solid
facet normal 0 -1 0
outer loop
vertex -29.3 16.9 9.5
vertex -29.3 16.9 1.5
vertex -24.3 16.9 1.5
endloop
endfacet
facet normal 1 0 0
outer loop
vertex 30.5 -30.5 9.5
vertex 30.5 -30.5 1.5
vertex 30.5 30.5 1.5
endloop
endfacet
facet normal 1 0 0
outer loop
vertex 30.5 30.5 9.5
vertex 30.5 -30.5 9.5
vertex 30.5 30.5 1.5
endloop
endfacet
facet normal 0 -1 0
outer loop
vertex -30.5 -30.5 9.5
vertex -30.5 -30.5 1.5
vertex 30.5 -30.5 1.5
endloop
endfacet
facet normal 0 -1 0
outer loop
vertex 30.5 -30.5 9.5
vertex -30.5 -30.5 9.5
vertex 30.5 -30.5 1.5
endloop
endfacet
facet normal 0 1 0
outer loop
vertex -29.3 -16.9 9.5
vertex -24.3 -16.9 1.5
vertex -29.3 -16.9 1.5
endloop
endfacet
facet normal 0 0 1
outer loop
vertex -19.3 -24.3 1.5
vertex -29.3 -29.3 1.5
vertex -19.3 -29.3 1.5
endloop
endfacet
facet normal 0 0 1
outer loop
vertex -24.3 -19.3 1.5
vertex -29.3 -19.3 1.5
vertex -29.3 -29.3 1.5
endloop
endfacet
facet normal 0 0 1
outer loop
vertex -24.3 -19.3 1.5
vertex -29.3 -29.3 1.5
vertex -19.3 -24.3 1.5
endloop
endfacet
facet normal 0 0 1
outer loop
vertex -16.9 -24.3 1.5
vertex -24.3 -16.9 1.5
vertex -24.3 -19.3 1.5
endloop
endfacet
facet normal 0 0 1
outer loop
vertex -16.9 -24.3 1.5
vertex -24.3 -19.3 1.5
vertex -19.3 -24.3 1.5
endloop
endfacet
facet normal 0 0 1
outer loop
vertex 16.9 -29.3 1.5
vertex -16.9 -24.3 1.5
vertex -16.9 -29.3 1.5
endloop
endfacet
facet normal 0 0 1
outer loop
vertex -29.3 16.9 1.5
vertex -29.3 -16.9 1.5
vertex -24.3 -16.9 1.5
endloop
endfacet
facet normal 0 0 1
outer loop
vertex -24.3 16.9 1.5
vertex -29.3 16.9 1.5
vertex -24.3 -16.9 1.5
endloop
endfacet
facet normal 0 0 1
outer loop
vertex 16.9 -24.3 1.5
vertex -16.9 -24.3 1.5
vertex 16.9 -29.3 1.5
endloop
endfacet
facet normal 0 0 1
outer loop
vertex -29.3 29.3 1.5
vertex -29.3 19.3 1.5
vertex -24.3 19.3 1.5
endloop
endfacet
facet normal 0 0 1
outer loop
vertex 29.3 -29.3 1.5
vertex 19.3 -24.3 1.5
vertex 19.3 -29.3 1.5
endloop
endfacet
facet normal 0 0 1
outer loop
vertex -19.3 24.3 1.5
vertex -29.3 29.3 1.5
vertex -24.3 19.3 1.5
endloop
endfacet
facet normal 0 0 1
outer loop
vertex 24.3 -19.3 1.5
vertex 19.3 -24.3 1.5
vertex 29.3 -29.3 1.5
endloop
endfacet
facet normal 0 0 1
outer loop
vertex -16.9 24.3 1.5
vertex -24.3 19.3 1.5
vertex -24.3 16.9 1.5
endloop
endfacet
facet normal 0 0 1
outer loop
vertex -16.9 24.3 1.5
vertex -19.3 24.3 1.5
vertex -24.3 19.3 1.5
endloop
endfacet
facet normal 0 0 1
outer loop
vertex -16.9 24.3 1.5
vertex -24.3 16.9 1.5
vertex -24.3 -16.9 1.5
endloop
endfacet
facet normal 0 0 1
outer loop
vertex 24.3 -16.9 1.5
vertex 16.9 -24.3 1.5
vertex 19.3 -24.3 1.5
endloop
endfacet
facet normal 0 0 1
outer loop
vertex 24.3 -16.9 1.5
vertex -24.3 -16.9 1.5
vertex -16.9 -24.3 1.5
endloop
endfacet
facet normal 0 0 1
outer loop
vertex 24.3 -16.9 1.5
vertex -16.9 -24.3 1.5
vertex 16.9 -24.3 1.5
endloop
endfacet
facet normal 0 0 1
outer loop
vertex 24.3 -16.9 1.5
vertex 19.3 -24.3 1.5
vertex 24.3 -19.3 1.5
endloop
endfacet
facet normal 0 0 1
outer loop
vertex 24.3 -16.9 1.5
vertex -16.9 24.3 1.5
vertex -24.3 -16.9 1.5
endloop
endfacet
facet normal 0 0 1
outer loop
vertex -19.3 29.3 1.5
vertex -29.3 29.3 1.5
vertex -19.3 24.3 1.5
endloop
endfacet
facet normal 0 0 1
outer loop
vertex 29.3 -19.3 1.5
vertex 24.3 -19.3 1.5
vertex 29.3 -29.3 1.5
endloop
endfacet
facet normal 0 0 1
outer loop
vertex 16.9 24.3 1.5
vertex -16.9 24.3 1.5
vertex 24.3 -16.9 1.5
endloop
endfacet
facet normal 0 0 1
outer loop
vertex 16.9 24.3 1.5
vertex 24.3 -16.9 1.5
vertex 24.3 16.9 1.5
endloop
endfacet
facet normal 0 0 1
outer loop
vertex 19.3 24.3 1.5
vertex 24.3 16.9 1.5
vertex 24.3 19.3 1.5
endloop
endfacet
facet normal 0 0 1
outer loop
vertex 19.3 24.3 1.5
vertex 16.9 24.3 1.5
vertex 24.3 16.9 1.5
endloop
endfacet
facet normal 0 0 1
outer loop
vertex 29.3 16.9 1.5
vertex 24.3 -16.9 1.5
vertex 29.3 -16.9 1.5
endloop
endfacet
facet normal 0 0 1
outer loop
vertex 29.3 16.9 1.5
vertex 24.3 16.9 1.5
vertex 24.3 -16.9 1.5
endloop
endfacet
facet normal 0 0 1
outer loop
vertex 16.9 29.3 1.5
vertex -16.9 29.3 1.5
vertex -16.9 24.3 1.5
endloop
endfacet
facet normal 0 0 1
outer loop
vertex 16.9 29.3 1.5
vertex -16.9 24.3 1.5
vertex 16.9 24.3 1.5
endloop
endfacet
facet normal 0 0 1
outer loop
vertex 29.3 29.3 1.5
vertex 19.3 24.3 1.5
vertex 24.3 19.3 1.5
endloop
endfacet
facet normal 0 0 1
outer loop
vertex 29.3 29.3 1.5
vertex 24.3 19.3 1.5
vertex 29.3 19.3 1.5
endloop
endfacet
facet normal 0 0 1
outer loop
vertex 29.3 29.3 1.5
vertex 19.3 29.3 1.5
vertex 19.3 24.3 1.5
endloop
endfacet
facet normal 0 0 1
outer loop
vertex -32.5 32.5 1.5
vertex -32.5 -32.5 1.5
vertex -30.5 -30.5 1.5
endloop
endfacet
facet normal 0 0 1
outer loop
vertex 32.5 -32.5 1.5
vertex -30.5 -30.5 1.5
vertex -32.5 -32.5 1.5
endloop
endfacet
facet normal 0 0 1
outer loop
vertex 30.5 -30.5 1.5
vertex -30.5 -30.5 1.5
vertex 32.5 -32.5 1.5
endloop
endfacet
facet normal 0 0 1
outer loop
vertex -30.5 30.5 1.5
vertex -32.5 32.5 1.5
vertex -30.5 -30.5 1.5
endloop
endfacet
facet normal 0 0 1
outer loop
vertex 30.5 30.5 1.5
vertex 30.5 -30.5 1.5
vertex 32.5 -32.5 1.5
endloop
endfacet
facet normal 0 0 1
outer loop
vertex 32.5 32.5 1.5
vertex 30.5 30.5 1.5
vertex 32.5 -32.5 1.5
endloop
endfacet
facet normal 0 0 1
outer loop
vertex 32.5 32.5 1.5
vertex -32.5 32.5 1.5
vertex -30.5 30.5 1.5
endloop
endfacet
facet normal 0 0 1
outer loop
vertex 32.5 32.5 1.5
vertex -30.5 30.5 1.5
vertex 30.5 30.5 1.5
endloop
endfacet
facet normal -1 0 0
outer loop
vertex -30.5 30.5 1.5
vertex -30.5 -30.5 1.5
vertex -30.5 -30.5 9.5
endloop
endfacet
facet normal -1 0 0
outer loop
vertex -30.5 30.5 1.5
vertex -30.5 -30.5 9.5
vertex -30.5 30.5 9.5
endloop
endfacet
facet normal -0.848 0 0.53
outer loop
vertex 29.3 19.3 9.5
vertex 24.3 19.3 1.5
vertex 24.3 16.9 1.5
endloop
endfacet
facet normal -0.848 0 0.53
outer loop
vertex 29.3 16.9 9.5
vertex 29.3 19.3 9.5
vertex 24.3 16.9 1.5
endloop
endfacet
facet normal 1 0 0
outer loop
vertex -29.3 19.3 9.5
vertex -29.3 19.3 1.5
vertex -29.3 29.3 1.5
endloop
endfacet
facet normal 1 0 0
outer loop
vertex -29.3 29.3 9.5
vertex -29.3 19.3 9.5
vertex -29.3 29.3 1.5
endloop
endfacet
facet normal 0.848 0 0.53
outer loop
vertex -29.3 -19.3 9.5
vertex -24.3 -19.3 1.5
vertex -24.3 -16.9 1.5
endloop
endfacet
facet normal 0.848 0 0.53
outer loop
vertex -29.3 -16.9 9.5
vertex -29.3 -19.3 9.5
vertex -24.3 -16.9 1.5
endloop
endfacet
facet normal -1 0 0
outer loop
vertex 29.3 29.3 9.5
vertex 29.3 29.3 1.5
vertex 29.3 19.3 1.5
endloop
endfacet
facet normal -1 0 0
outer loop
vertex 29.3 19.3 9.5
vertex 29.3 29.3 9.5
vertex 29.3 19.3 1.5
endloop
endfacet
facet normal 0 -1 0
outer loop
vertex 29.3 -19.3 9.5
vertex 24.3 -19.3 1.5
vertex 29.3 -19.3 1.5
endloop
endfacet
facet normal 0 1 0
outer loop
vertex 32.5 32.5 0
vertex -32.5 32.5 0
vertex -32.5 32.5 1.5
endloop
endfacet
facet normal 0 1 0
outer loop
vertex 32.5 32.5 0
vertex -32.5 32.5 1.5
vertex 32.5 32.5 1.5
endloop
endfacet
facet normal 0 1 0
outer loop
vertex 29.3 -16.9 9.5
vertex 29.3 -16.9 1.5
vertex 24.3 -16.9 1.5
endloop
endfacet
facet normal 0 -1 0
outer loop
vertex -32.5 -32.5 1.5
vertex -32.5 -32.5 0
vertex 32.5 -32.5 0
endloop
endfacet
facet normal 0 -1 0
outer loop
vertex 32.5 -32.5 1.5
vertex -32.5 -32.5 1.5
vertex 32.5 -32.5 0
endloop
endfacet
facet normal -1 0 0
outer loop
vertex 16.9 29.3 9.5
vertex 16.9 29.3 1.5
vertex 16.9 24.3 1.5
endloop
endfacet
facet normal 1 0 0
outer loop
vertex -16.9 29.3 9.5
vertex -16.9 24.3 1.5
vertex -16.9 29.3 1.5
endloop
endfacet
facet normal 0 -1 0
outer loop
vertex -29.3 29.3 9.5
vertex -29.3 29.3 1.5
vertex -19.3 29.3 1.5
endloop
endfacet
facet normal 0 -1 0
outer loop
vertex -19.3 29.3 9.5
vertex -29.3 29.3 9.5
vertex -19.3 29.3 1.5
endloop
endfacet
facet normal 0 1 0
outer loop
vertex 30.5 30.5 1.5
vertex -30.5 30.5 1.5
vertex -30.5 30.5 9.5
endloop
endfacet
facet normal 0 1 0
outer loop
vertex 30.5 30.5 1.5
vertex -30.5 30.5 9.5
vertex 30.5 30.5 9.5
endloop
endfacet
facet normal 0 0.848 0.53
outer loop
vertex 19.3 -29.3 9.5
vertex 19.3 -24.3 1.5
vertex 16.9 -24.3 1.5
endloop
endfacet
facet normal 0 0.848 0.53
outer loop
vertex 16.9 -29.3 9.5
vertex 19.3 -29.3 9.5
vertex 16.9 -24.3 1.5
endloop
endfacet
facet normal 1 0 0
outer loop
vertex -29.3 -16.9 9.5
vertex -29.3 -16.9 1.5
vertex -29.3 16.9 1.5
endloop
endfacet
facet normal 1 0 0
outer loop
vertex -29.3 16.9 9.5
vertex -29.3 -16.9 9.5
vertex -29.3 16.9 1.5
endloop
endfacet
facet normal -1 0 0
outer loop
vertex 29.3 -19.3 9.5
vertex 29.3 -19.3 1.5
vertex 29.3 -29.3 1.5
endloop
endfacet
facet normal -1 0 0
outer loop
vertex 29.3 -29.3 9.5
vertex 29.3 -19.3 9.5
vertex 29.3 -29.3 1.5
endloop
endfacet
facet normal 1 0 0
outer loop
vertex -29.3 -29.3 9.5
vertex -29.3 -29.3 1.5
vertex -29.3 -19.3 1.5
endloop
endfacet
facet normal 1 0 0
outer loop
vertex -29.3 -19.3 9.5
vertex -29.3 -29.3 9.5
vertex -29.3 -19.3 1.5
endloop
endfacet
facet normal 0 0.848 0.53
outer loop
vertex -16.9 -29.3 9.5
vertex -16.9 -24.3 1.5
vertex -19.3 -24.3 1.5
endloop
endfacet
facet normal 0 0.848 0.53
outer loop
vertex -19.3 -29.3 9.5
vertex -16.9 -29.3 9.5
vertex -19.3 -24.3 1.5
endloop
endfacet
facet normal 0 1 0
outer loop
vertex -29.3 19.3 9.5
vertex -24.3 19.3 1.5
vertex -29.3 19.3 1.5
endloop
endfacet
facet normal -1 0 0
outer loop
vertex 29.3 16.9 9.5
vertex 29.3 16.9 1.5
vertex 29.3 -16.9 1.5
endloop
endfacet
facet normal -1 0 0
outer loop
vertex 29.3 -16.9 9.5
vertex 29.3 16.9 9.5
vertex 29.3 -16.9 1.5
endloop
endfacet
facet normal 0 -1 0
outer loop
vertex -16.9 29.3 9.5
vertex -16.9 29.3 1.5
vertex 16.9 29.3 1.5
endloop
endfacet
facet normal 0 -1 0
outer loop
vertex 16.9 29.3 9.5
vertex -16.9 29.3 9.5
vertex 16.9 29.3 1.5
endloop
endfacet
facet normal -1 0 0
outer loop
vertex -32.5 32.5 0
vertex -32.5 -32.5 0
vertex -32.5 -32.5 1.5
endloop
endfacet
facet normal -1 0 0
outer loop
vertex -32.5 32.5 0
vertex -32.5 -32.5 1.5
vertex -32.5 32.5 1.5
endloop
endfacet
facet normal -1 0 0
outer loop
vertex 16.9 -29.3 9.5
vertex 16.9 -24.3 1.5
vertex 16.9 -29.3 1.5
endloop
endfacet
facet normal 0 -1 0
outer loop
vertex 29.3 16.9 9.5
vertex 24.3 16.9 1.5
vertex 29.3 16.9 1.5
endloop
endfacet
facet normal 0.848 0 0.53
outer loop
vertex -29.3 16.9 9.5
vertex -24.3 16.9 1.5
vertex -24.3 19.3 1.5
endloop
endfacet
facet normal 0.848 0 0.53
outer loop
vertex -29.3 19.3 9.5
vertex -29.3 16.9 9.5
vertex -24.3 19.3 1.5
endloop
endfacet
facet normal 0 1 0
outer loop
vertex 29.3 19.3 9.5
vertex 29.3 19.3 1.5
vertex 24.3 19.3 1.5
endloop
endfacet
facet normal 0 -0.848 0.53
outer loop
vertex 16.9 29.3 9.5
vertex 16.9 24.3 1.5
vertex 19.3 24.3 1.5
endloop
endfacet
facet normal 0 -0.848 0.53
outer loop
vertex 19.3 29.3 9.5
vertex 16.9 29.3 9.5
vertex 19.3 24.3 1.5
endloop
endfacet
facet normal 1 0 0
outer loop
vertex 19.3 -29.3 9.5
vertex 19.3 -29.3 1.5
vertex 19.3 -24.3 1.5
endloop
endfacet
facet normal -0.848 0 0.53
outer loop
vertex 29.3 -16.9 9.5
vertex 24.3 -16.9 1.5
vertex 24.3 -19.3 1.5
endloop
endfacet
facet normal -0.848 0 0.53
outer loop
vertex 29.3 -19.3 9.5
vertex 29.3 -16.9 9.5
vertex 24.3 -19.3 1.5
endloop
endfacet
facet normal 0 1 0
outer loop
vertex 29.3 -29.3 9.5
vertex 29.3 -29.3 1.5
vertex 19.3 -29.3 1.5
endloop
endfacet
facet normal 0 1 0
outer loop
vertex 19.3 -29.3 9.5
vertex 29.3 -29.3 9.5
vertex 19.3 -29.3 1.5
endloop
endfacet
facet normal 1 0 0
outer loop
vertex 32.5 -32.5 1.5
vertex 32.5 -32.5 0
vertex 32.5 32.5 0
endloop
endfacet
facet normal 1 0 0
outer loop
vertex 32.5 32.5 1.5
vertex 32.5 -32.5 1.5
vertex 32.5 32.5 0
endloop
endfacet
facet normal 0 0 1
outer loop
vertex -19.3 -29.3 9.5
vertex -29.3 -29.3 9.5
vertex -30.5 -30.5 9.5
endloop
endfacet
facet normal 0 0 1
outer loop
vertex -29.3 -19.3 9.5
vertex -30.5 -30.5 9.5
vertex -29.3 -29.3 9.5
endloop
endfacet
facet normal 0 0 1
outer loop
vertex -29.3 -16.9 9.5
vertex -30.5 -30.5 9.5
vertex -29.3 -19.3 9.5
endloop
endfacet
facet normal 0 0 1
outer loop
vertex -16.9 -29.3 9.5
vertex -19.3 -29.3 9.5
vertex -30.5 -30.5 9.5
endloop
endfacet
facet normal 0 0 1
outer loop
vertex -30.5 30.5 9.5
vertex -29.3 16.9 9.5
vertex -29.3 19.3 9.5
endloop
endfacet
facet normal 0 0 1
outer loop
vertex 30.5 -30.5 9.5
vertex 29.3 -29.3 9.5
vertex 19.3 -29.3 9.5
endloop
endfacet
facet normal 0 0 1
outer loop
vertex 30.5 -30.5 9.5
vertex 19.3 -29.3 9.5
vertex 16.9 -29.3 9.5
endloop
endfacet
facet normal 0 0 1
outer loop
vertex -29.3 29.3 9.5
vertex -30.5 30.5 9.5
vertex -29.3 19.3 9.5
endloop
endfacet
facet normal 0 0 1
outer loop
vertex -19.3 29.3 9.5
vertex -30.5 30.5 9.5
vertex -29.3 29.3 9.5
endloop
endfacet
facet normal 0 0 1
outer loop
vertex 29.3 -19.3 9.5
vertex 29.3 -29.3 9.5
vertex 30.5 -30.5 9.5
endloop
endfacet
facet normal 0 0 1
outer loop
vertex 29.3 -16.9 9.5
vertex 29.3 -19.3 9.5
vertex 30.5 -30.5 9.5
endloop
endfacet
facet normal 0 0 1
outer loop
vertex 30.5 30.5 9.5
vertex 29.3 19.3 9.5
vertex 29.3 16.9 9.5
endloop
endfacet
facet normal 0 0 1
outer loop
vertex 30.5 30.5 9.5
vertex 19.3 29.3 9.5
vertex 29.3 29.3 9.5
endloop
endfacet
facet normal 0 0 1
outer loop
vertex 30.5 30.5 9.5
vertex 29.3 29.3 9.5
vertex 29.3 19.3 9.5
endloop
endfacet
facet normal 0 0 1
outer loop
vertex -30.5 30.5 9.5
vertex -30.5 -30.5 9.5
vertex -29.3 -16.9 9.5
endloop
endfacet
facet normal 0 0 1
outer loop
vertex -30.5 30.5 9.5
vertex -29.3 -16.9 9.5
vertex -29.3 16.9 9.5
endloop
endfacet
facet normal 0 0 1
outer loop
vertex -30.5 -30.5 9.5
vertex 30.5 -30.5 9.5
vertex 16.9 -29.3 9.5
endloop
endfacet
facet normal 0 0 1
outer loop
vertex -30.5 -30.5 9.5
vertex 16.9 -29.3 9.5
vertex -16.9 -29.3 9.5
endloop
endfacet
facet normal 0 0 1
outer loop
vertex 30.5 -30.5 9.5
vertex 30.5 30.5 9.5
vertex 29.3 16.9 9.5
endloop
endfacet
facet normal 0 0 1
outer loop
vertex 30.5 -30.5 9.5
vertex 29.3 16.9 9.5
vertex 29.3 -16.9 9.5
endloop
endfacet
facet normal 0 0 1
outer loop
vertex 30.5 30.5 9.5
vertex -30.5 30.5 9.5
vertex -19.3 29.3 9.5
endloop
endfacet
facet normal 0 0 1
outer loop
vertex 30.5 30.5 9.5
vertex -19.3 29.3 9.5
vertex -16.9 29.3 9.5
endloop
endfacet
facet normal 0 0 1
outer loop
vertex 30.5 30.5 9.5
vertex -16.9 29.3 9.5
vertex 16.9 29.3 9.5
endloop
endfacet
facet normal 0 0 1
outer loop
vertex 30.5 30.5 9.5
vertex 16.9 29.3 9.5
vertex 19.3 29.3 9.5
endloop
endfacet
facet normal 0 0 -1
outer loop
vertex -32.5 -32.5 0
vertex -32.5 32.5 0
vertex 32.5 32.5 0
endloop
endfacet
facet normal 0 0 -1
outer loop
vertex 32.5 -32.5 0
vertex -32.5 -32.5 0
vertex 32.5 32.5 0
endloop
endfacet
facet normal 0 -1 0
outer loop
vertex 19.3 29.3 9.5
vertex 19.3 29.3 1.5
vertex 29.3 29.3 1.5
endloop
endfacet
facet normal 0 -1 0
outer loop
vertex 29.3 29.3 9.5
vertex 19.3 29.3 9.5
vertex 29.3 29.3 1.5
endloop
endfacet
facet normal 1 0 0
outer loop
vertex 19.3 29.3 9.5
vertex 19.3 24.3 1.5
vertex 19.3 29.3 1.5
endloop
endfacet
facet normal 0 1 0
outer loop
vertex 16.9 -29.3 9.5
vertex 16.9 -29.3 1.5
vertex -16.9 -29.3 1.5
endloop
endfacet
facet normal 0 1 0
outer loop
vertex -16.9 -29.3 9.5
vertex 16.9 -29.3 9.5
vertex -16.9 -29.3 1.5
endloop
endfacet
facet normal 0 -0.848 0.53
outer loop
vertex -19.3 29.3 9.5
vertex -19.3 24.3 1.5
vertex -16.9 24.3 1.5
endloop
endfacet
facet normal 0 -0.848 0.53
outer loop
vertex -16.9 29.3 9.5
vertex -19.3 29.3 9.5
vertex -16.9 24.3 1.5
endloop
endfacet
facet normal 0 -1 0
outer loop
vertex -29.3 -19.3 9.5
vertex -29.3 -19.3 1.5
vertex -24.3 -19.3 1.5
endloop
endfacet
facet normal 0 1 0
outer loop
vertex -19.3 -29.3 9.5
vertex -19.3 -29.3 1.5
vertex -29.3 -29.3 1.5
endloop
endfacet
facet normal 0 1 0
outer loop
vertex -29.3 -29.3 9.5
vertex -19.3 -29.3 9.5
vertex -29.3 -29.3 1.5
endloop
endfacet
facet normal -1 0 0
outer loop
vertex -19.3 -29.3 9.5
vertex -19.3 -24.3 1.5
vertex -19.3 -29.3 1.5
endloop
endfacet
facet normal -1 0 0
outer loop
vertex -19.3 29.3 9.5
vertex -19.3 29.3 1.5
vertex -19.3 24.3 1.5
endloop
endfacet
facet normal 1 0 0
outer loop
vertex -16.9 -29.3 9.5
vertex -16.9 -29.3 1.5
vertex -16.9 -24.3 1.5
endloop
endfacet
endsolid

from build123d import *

# Parameters (mm, degrees)
F0_W     = 65
F0_H     = 65
F1_DEPTH = 1.5
F2_W     = 61
F2_H     = 61
F3_DEPTH = 8
F4_SIZE2 = 7.99999
F4_SIZE  = 4.99999


# Not quite as in the source:
# - a fillet or chamfer is up to 0.001 mm smaller than in the source, because OpenCascade refuses the exact size


with BuildPart() as f1:
    # F0 (on Top) → F1 (new body)
    with BuildSketch(Plane.XY):
        Rectangle(F0_W, F0_H)
    extrude(amount=F1_DEPTH)

    # F2 (on face) → F3 (join)
    with BuildSketch(Plane.XY.offset(1.5)):
        Rectangle(F2_W, F2_H)
        Polygon((-29.3, 19.3), (-29.3, 29.3), (-19.3, 29.3), (-19.3, 24.3), (-16.9, 24.3), (-16.9, 29.3), (16.9, 29.3), (16.9, 24.3), (19.3, 24.3), (19.3, 29.3), (29.3, 29.3), (29.3, 19.3), (24.3, 19.3), (24.3, 16.9), (29.3, 16.9), (29.3, -16.9), (24.3, -16.9), (24.3, -19.3), (29.3, -19.3), (29.3, -29.3), (19.3, -29.3), (19.3, -24.3), (16.9, -24.3), (16.9, -29.3), (-16.9, -29.3), (-16.9, -24.3), (-19.3, -24.3), (-19.3, -29.3), (-29.3, -29.3), (-29.3, -19.3), (-24.3, -19.3), (-24.3, -16.9), (-29.3, -16.9), (-29.3, 16.9), (-24.3, 16.9), (-24.3, 19.3), align=None, mode=Mode.SUBTRACT)
    extrude(amount=F3_DEPTH)

    # F4 (size 5 and 8 in the source; OpenCascade refuses exactly that, so slightly less here)
    f4_edges = [f1.edges().sort_by_distance(p)[0] for p in [
        (-24.3, 18.1, 9.5),
        (-18.1, 24.3, 9.5),
        (18.1, 24.3, 9.5),
        (24.3, 18.1, 9.5),
        (-18.1, -24.3, 9.5),
        (-24.3, -18.1, 9.5),
        (18.1, -24.3, 9.5),
        (24.3, -18.1, 9.5),
    ]]
    f4_side = f1.faces().sort_by_distance((0, 29.63733, 9.5))[0]
    chamfer(f4_edges, length=F4_SIZE, length2=F4_SIZE2, reference=f4_side)


solid = f1.part
